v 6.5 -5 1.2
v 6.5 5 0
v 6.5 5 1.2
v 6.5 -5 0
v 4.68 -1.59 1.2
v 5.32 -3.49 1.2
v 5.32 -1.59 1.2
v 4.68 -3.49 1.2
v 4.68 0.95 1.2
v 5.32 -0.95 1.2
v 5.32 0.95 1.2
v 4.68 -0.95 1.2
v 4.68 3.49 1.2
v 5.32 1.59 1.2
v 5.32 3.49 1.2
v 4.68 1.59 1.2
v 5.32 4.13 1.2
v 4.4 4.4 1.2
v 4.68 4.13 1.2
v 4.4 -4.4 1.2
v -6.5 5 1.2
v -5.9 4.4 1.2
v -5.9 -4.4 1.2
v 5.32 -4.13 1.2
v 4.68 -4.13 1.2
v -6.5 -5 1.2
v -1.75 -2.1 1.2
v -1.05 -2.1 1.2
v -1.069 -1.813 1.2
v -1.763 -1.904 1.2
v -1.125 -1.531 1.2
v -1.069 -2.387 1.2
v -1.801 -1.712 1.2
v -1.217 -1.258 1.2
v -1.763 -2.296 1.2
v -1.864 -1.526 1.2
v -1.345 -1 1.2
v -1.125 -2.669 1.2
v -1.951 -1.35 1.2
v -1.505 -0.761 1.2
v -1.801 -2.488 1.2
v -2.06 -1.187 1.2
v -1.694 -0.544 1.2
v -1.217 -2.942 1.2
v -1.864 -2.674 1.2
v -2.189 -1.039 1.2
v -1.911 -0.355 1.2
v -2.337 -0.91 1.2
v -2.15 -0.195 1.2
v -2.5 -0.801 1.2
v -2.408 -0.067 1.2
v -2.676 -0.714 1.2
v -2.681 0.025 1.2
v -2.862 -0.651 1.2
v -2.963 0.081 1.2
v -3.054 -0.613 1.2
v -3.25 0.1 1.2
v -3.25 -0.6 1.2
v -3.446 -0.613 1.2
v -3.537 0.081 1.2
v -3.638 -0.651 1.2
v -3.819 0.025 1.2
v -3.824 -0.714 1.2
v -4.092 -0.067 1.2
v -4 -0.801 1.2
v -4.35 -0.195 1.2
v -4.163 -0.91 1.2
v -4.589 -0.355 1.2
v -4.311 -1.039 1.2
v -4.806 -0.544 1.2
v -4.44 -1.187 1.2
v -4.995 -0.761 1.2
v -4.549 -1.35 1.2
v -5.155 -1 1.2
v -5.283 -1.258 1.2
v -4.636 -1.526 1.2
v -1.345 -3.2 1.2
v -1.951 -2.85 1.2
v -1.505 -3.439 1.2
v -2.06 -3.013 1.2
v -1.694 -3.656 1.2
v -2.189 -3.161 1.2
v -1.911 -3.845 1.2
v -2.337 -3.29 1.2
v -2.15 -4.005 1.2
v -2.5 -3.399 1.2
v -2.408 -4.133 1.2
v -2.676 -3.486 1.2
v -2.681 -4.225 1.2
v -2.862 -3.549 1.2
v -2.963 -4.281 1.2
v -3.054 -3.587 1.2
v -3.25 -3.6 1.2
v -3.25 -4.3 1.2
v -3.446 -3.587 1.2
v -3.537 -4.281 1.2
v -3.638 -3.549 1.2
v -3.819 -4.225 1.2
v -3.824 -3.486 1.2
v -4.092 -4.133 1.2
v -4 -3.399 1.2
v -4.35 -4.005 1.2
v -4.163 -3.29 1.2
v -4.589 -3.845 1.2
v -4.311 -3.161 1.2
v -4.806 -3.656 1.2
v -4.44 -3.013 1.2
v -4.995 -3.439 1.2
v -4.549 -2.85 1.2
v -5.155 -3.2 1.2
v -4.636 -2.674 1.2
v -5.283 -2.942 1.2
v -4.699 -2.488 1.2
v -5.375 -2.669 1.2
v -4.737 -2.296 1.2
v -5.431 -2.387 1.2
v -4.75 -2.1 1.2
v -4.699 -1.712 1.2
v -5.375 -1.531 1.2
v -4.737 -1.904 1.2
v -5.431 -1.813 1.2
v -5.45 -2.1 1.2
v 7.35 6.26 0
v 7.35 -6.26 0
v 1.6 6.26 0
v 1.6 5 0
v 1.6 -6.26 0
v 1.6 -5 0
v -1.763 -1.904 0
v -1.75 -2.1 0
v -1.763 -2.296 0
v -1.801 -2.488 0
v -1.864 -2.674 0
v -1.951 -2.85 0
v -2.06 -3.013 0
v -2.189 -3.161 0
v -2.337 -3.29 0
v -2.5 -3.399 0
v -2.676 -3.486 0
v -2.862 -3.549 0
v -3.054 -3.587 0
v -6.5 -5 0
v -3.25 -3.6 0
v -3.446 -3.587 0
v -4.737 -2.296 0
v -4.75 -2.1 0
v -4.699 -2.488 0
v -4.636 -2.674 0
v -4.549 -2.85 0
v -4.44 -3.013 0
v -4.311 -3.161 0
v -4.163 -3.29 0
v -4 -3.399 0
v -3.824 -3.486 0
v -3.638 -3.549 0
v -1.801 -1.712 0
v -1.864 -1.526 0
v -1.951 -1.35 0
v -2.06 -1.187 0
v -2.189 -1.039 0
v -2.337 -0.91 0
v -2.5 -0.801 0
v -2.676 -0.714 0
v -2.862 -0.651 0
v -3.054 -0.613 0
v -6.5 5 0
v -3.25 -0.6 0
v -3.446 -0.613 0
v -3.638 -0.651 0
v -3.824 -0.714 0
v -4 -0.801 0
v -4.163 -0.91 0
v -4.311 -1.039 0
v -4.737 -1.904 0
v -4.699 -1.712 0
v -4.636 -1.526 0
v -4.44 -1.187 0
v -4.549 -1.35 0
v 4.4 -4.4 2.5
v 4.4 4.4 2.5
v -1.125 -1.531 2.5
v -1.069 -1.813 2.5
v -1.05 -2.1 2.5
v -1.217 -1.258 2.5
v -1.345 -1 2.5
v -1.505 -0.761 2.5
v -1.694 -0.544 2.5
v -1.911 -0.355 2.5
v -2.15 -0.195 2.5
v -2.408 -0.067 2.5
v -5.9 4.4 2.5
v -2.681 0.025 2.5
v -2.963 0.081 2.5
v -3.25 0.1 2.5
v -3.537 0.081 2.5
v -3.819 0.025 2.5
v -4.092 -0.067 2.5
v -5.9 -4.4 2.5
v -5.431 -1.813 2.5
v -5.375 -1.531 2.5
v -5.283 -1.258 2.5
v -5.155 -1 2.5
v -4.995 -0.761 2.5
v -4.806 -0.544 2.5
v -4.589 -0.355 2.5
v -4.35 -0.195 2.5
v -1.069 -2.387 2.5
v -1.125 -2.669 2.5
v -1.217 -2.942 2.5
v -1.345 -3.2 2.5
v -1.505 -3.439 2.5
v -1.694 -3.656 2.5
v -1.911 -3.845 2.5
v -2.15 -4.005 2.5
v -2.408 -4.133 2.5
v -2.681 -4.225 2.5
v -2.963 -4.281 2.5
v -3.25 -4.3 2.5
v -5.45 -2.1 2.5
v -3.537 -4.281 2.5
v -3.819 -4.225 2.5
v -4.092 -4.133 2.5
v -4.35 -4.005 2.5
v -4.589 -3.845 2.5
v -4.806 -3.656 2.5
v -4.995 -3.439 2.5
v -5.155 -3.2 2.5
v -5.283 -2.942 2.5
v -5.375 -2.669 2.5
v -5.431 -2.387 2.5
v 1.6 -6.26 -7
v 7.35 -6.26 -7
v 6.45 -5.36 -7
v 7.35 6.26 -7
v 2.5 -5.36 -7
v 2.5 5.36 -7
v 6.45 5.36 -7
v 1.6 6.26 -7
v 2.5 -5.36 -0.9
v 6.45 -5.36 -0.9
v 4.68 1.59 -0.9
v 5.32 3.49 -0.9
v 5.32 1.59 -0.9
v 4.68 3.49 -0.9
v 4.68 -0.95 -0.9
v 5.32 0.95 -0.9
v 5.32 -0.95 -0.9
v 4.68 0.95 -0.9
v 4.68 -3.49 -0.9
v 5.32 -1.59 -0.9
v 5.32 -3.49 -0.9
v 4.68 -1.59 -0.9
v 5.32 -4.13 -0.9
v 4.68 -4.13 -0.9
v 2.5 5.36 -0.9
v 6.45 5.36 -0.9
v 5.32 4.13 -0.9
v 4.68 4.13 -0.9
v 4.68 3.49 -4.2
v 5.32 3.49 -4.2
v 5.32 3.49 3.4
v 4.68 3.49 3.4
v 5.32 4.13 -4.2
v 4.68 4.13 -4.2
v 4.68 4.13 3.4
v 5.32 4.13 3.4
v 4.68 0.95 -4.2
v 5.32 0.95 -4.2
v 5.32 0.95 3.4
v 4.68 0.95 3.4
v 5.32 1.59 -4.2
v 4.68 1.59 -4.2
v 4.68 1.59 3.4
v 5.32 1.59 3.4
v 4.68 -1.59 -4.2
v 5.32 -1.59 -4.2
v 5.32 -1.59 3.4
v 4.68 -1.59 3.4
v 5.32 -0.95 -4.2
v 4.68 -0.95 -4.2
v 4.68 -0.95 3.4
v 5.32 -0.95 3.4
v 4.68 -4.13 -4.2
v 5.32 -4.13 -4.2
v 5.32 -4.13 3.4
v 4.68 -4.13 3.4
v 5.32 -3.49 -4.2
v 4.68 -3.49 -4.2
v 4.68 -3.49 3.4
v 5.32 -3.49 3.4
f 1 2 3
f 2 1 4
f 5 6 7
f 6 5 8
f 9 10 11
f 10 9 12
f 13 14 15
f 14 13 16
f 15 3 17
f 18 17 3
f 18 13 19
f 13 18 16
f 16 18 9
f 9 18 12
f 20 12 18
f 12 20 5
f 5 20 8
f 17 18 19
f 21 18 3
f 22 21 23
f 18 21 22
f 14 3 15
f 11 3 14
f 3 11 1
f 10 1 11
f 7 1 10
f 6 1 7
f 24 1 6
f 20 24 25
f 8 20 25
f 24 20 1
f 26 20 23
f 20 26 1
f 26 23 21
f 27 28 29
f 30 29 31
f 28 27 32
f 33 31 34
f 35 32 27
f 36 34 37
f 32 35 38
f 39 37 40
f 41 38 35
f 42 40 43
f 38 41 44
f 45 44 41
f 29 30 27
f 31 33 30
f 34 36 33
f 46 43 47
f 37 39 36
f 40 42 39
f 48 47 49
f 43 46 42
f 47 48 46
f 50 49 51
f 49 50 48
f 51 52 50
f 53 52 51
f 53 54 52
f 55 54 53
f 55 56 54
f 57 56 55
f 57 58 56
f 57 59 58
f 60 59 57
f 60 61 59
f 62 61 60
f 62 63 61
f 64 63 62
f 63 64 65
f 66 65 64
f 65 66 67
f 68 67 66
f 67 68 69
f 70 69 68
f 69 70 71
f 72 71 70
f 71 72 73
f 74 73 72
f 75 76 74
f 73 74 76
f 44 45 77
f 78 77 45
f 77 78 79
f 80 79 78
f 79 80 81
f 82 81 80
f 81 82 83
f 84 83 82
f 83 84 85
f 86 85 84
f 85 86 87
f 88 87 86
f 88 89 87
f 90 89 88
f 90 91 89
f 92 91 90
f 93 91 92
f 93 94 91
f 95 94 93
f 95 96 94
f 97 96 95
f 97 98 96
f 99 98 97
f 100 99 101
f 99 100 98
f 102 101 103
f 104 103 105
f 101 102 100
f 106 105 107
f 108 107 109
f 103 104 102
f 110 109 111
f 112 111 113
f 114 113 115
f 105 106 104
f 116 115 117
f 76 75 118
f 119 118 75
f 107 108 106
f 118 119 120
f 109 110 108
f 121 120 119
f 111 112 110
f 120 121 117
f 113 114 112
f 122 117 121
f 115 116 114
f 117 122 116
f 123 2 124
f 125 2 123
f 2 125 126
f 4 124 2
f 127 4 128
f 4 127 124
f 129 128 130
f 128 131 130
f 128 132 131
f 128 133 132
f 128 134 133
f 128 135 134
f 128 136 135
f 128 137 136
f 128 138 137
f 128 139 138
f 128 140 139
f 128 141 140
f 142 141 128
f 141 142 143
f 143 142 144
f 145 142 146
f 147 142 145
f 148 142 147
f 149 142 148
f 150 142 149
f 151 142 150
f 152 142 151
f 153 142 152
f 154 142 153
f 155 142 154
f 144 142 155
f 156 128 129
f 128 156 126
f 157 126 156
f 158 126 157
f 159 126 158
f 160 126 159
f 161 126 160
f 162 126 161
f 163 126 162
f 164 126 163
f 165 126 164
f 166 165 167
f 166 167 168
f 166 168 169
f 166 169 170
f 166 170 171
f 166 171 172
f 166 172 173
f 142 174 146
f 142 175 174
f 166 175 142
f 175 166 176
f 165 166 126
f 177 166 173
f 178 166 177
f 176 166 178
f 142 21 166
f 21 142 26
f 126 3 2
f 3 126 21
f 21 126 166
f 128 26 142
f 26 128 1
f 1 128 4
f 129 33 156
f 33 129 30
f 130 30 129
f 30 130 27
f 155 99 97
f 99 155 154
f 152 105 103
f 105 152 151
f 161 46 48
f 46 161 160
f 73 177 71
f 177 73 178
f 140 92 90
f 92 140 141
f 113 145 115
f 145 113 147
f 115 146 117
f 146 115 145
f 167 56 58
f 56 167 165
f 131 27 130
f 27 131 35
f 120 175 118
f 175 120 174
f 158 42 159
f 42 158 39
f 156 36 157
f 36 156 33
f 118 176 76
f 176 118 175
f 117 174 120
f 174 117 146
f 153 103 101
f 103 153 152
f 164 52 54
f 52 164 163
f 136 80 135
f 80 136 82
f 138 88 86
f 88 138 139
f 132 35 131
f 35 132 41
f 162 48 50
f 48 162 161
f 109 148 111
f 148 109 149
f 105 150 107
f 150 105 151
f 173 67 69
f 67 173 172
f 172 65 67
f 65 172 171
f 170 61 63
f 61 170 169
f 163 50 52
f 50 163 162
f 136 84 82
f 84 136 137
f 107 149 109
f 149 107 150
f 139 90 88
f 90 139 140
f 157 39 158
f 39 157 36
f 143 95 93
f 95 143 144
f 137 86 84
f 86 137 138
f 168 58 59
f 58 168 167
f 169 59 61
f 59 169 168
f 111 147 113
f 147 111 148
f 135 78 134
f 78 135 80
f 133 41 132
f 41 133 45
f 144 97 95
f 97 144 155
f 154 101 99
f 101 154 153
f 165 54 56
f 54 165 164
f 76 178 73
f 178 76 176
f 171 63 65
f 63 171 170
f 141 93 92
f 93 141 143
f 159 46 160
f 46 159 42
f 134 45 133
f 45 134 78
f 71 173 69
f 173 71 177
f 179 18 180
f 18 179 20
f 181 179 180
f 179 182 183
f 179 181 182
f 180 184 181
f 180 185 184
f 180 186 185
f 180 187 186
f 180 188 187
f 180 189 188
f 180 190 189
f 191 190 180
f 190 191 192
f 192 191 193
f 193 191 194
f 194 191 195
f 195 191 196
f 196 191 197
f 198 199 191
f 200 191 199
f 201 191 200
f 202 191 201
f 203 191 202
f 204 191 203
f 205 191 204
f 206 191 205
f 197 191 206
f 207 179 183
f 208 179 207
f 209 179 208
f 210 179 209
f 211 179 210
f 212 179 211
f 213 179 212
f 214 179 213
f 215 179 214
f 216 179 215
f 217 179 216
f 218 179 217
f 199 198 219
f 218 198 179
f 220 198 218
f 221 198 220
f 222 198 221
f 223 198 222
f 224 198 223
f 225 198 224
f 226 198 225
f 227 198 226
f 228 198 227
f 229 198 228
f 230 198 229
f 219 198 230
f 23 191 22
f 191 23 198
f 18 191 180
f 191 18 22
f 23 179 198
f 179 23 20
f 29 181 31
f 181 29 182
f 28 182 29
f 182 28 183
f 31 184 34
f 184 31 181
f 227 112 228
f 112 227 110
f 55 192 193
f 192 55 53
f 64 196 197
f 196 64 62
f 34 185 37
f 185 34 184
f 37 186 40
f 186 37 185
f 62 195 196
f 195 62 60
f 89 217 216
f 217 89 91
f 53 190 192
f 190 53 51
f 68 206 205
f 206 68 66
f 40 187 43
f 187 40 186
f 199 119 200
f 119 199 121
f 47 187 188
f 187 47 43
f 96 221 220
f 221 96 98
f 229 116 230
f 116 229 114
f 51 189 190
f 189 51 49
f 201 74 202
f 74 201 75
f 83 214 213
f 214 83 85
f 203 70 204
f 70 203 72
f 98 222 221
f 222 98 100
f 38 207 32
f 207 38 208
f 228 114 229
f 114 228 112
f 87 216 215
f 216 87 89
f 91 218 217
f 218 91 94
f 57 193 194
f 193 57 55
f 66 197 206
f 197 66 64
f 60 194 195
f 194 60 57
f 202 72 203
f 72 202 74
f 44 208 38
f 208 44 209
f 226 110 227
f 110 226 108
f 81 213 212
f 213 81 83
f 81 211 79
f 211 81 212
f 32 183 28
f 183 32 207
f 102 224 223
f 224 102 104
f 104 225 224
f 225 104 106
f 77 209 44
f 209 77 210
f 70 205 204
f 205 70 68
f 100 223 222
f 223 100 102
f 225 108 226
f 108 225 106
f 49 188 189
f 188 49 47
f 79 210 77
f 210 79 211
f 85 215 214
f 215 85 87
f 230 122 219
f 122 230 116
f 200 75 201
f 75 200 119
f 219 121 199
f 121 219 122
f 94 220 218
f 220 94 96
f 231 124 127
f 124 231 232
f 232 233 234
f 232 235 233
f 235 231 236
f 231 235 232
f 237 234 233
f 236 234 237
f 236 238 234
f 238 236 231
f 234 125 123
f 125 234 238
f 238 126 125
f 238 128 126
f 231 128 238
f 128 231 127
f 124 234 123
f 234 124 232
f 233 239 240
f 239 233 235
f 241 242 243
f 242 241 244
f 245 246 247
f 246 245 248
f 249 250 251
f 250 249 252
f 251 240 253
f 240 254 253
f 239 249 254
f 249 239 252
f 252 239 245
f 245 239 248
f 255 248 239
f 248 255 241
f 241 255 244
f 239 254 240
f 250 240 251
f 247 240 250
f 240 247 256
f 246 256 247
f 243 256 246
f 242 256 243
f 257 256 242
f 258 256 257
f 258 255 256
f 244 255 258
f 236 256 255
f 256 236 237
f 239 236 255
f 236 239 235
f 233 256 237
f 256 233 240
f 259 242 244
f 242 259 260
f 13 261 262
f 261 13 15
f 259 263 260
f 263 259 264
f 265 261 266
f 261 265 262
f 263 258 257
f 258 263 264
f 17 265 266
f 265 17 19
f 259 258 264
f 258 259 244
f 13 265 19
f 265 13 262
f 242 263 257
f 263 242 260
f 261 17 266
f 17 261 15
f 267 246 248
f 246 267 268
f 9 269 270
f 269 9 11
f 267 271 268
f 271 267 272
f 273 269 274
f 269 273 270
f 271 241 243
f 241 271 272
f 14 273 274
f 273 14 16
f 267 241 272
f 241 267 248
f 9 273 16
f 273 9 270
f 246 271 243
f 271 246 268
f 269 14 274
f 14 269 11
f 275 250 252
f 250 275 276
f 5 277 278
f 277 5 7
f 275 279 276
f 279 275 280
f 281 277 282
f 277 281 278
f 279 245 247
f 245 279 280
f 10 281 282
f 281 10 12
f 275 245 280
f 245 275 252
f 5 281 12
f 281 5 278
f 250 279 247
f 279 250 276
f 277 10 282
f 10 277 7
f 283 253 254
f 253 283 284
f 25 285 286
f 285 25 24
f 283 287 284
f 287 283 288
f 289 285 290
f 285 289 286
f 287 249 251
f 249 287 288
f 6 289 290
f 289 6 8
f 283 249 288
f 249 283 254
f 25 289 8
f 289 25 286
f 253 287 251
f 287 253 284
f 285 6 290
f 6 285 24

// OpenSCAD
// file: connector.scad
// ---------------------------------------------------------------------------
// connector.scad - "JST-XH style" 2.54 mm 4-pin board header.
//
// Rough model, same spirit as the others: the shroud outline, height and pin
// pattern are real; the latch ramp and internal detail are not modeled.
//
// Origin: center of the pin row, on the board surface.
//   Z = 0 is the PCB TOP face - the connector sits on it, pins run negative.
//   (Note this differs from esp32.scad / perfboard.scad, where Z = 0 is the
//   PCB bottom. Placing this on the perfboard means translating to Z = pb_thick.)
//   +X runs along the pin row, +Y toward the latch side.
//
// Render:  openscad -o build/connector.stl hardware/connector.scad
// ---------------------------------------------------------------------------

include <params.scad>

$fn = $preview ? 24 : 48;

// Pin 1 .. n centers along X, centered on the origin.
function xh_pin_x(i) = -xh_pin_span/2 + i*xh_pitch;

module xh_pins() {
    for (i = [0 : xh_pins-1])
        translate([xh_pin_x(i), 0, -xh_pin_below])
            cube([xh_pin_sq, xh_pin_sq, xh_pin_below + xh_body_h*0.6], center = false);
}

// Shroud: a box around the pin row, deeper on the latch side, hollowed from
// the top so the model reads as a socket rather than a solid block.
module xh_shroud() {
    wall = 0.9;
    difference() {
        translate([-xh_body_len/2, -xh_body_front, 0])
            cube([xh_body_len, xh_body_front + xh_body_back, xh_body_h]);
        translate([-xh_body_len/2 + wall, -xh_body_front + wall, wall])
            cube([xh_body_len - 2*wall,
                  xh_body_front + xh_body_back - 2*wall,
                  xh_body_h]);
    }
}

module xh_header() {
    color("#e8e8e8") xh_shroud();
    color("#c8a24a") translate([-xh_pin_sq/2, -xh_pin_sq/2, 0]) xh_pins();
}

// Drill pattern, for cutting into a carrier board.
module xh_drills(h = 10) {
    for (i = [0 : xh_pins-1])
        translate([xh_pin_x(i), 0, -h/2]) cylinder(h = h, d = xh_drill);
}

// Clearance solid including the MATED plug. Use this against a lid, not
// xh_header() - the plug is what actually collides.
module xh_mated_keepout(gap = clearance) {
    translate([0, (xh_body_back - xh_body_front)/2, xh_mated_h/2 - gap/2])
        cube([xh_body_len + 2*gap,
              xh_body_front + xh_body_back + 2*gap,
              xh_mated_h + gap], center = true);
}

// --- guards -----------------------------------------------------------------

assert(xh_pitch > 2.4 && xh_pitch < 2.6, "XH pitch should be 2.50 or 2.54");
assert(xh_drill > xh_pin_sq * 1.414,
       "drill smaller than the diagonal of the square post");
assert(xh_mated_h > xh_body_h,
       "mated height must exceed the bare header height");

xh_header();
// main file
// ---------------------------------------------------------------------------
// sensor.scad - purple "GYBMEP" BME280 breakout, and the sensor-end assembly.
//
// Rough, and rougher than the other models: this part has only been photographed
// hand-held and at an angle, so the outline is corroborated (13 x 10, two
// sources within 0.5 mm) but the mounting hole and component heights are
// estimates. See the [EST] tags in params.scad before trusting anything here
// for a screw boss.
//
// Origin: center of the PCB footprint, Z = 0 at the PCB's trace-only face.
// +X toward the connector edge, connector pins running along Y.
//
// SIDEDNESS: the connector body is mounted on the TRACE side (-Z), and the
// components - BME280 can, XC6206 regulator, passives - are on the opposite
// face (+Z). The connector's pins therefore pass up through the board and are
// soldered on the component side, which is what the four dark blobs along the
// top edge of images/sensor_bottom.jpg actually are. The white housing is only
// visible around the board's edges in that photo because it is wider than the
// board it is mounted to.
//
// Render:
//   openscad -o build/sensor.stl          -D 'part="board"'    hardware/sensor.scad
//   openscad -o build/sensor_assembly.stl -D 'part="assembly"' hardware/sensor.scad
// ---------------------------------------------------------------------------

include <params.scad>
use <connector.scad>

part = "assembly";      // "board" | "assembly"
$fn = $preview ? 24 : 48;

// --- the breakout -----------------------------------------------------------

module bme_pcb() {
    difference() {
        translate([0, 0, bme_pcb_thick/2])
            cube([bme_len, bme_width, bme_pcb_thick], center = true);
        translate([bme_mount_x, bme_mount_y, -1])
            cylinder(h = bme_pcb_thick + 2, d = bme_mount_dia);
    }
}

// Everything on the top face as one keep-out slab: the BME280 can, the XC6206
// regulator and the passives. Individually modeling them would imply a
// precision the source photo does not support.
module bme_components() {
    inset = 0.6;
    keepout = 0.7;      // annular clearance kept free around the mounting hole
    difference() {
        translate([-bme_len/2 + inset, -bme_width/2 + inset, bme_pcb_thick])
            cube([bme_len - bme_conn_inset - 2*inset,
                  bme_width - 2*inset,
                  bme_comp_h]);
        // the real board keeps this area clear so a screw head can land
        translate([bme_mount_x, bme_mount_y, bme_pcb_thick - 1])
            cylinder(h = bme_comp_h + 2, d = bme_mount_dia + 2*keepout);
    }
}

module sensor_board() {
    color("#6b3fa0") bme_pcb();
    color("#3a3a3a") bme_components();
}

// --- sensor end, with the connector fitted ----------------------------------

// Where the connector sits, and how far it reaches. Exposed as functions so the
// pod can be built from them: `use <sensor.scad>` imports functions but not
// variables. Note the shroud is asymmetric about its pin row, and the 90 degree
// rotation below puts the DEEP side (xh_body_back) toward -X.
function bme_conn_x()  = bme_len/2 - bme_conn_inset;
function bme_conn_x0() = bme_conn_x() - xh_body_back;    // toward the board
function bme_conn_x1() = bme_conn_x() + xh_body_front;   // past the board edge

// Tallest thing on the component face. The connector's pin tails win over the
// BME280 can, which is worth knowing before sizing a chamber to the can.
function bme_above() = max(bme_pcb_thick + bme_comp_h, xh_pin_below);

// Connector hangs off the trace side (Z = 0), body pointing down, pins passing
// up through the board to be soldered on the component face.
module sensor_assembly() {
    sensor_board();
    translate([bme_conn_x(), 0, 0])
        rotate([180, 0, 0]) rotate([0, 0, 90]) xh_header();
}

// Clearance solid for the pod. Same role as mcu_keepout() at the other end.
module sensor_keepout(gap = clearance) {
    // the PCB
    translate([0, 0, bme_pcb_thick/2])
        cube([bme_len + 2*gap, bme_width + 2*gap, bme_pcb_thick + 2*gap],
             center = true);
    // everything on the component face as one slab. The real parts are inset
    // 0.6 from the edges; a full-footprint slab is the conservative read.
    translate([0, 0, bme_pcb_thick + (bme_comp_h + gap)/2])
        cube([bme_len + 2*gap, bme_width + 2*gap, bme_comp_h + gap],
             center = true);
    // The connector's pin tails, soldered on the component face. Sized from the
    // pin row itself plus a solder fillet - padding this out to a whole pitch
    // makes it wider than the 10 mm board the pins are soldered to, which is
    // impossible, and reports a collision against any pod built to the board.
    translate([bme_conn_x(), 0, (xh_pin_below + gap)/2])
        cube([xh_pin_sq + 1.0 + 2*gap,
              xh_pin_span + xh_pin_sq + 1.0 + 2*gap,
              xh_pin_below + gap], center = true);
    // the mated plug, hanging off the trace face
    translate([bme_conn_x(), 0, 0])
        rotate([180, 0, 0]) rotate([0, 0, 90]) xh_mated_keepout(gap);
}

// --- guards -----------------------------------------------------------------

assert(xh_pin_span < bme_width,
       "connector pin row is wider than the board edge it sits on");
assert(abs(bme_mount_x) + bme_mount_dia/2 < bme_len/2,
       "mounting hole breaks the board end");
assert(abs(bme_mount_y) + bme_mount_dia/2 < bme_width/2,
       "mounting hole breaks the board side");
assert(bme_mount_x + bme_mount_dia/2 < bme_len/2 - bme_conn_inset - xh_body_depth/2,
       "mounting hole collides with the connector footprint");

// --- output -----------------------------------------------------------------

if      (part == "board")    sensor_board();
else if (part == "assembly") sensor_assembly();
else assert(false, "part must be \"board\" or \"assembly\"");

// The connector and the components face opposite ways, so the sensor end's
// envelope straddles the board rather than stacking on one side of it.
echo(str("sensor board ", bme_len, " x ", bme_width, " mm"));
echo(str("  component side: +", bme_pcb_thick + bme_comp_h,
         " mm  (plus ", xh_pin_below - bme_pcb_thick,
         " mm of connector pin poking through)"));
echo(str("  trace side:     -", xh_mated_h, " mm to the mated plug face"));
echo(str("  total across the board = ",
         xh_mated_h + max(bme_pcb_thick + bme_comp_h, xh_pin_below), " mm"));
